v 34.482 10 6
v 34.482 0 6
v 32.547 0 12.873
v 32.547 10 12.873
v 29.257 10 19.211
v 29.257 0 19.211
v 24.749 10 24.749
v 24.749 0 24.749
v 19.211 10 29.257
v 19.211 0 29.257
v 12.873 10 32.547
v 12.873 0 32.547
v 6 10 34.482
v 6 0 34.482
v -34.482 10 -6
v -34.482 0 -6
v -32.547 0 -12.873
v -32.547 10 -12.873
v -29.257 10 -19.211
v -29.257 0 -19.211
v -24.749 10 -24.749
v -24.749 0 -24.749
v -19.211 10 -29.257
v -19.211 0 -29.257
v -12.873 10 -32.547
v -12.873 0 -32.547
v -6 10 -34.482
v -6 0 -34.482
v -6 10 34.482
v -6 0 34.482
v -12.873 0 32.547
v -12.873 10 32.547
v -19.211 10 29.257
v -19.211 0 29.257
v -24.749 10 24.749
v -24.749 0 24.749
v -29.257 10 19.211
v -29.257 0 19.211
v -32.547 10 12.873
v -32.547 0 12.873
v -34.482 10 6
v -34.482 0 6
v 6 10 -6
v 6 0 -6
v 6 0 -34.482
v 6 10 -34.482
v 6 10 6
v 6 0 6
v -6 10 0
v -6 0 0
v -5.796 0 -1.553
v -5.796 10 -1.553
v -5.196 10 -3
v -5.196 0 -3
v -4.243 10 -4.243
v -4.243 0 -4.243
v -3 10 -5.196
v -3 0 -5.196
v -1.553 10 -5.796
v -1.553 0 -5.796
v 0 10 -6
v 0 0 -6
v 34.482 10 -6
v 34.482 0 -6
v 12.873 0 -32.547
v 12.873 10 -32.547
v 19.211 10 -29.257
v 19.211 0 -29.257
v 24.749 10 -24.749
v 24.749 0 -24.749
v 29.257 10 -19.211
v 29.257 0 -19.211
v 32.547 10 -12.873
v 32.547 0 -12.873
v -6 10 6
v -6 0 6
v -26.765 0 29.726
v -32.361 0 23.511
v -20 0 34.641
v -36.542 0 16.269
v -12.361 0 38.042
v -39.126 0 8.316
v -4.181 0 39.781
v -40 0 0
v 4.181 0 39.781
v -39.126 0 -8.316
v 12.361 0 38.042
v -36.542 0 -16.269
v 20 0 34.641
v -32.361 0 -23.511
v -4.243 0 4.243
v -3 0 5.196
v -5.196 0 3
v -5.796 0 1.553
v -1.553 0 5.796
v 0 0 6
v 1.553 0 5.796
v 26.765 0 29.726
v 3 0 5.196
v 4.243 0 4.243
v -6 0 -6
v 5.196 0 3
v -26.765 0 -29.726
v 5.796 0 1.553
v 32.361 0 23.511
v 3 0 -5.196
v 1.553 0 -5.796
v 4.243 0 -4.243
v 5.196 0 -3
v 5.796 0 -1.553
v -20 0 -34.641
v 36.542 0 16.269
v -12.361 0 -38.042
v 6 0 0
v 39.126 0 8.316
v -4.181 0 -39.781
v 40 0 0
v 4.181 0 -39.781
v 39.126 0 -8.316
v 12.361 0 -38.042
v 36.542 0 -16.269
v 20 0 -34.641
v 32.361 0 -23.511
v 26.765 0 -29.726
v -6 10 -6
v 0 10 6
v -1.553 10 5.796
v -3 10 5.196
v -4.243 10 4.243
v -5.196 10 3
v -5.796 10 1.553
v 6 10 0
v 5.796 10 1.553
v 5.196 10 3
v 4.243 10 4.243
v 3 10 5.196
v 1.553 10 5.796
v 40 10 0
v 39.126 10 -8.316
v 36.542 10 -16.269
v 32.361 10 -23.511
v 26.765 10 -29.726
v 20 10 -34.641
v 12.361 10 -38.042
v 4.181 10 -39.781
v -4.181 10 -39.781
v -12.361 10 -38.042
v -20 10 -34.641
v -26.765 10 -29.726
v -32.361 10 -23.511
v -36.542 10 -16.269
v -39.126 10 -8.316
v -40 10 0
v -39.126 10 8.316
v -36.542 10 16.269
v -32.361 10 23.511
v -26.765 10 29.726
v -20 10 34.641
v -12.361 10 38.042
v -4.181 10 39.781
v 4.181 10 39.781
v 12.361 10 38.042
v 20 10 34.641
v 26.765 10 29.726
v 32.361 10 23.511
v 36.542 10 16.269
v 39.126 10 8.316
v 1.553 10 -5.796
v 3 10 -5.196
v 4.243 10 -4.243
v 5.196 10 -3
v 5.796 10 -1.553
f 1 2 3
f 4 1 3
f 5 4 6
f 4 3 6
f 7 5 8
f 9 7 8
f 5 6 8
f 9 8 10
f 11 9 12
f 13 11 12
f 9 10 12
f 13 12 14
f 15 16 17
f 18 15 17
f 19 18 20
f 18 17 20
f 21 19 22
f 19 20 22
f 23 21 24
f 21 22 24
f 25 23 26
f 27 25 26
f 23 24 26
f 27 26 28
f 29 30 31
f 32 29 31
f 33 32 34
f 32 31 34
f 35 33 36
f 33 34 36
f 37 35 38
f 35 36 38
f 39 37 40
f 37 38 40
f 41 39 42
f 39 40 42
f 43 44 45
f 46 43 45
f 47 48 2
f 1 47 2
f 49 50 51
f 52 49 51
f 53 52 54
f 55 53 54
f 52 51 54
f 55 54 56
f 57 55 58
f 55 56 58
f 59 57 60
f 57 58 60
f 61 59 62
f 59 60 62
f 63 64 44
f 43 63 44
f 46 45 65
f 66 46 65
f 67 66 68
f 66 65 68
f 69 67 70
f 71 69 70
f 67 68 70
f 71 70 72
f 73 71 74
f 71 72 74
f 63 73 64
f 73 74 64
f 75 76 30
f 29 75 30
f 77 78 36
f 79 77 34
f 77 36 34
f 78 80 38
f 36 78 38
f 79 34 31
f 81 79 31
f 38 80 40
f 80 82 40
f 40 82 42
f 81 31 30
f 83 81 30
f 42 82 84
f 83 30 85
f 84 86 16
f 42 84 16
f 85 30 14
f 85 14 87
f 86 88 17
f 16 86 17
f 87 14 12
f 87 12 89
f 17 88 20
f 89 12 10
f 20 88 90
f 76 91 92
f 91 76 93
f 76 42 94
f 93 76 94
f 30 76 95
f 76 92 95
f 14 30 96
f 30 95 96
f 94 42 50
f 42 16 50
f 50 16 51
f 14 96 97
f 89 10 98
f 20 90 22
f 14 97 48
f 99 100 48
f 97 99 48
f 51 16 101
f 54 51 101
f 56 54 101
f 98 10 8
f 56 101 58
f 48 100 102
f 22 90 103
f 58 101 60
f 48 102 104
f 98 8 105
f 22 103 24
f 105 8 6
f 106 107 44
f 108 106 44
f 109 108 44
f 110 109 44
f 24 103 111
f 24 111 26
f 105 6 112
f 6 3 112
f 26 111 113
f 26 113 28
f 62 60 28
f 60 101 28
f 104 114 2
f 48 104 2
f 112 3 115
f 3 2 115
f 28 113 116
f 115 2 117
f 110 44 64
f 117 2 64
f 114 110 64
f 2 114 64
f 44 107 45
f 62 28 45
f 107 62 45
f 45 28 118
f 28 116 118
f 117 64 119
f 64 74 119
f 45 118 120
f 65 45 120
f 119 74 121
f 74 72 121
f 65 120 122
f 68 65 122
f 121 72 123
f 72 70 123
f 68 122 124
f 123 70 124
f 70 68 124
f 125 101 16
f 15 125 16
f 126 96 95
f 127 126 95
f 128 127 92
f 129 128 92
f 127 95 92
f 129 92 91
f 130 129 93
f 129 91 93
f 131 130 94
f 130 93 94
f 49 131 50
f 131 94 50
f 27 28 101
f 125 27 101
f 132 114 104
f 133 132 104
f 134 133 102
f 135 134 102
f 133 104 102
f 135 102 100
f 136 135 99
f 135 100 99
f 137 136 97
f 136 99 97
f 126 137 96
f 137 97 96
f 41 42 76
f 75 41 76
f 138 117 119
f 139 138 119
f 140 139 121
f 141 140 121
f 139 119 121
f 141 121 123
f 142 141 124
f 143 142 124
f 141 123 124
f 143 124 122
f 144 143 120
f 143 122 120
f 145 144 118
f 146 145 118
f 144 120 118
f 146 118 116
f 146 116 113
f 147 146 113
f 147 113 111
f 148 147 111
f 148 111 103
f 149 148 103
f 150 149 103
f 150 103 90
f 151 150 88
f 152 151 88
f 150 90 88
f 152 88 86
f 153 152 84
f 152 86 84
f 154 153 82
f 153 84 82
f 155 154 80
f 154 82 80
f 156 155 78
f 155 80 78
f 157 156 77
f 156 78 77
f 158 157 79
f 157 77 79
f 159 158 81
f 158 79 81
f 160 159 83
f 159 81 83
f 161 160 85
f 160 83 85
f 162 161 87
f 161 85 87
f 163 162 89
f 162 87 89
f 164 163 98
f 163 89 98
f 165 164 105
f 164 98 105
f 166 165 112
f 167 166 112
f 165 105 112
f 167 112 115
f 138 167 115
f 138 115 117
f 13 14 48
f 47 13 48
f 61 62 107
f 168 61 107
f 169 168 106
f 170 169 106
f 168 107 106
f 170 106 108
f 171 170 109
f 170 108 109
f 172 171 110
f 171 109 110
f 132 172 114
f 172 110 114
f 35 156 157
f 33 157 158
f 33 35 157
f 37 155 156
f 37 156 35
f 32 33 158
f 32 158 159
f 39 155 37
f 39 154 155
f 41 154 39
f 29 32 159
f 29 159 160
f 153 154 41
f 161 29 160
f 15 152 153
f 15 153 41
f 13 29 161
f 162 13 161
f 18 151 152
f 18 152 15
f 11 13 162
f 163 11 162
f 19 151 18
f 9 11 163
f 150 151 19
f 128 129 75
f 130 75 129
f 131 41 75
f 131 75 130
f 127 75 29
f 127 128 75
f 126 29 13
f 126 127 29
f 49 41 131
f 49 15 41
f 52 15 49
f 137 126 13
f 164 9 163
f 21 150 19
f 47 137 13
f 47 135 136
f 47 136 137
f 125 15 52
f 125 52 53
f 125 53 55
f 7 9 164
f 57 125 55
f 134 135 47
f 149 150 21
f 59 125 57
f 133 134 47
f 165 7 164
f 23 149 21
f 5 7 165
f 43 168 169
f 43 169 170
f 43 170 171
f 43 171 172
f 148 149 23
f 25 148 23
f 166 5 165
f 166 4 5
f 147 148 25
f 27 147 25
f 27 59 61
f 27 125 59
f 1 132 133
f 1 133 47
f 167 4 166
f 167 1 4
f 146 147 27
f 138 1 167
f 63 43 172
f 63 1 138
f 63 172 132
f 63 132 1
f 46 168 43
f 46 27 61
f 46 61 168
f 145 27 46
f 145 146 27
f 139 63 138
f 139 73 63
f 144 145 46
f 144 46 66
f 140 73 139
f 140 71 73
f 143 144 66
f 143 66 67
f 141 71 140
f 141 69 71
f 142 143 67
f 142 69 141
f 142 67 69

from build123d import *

# Parameters (mm, degrees)
SKETCH1_R           = 40
SKETCH1_R_2         = 35
BOSS_EXTRUDE1_DEPTH = 10


with BuildPart() as part:
    # Sketch1 → Boss-Extrude1 (new body)
    with BuildSketch(Plane(origin=(0, 0, 0), x_dir=(1, 0, 0), z_dir=(0, 1, 0))):
        Circle(SKETCH1_R)
        Circle(SKETCH1_R_2, mode=Mode.SUBTRACT)
        with BuildLine():
            Line((-6, 0), (-6, 6))
            Line((-6, 6), (-34.481879299, 6))
            ThreePointArc((-34.481879299, 6), (-35, 0), (-34.481879299, -6))
            Line((-34.481879299, -6), (-6, -6))
            Line((-6, -6), (-6, 0))
        make_face()
        with BuildLine():
            Line((6, -34.481879299), (6, -6))
            Line((6, -6), (0, -6))
            Line((0, -6), (-6, -6))
            Line((-6, -6), (-6, -34.481879299))
            ThreePointArc((-6, -34.481879299), (0, -35), (6, -34.481879299))
        make_face()
        with BuildLine():
            Line((6, 6), (6, 0))
            Line((6, 0), (6, -6))
            Line((6, -6), (34.481879299, -6))
            ThreePointArc((34.481879299, -6), (34.870229247, -3.011164603), (35, 0))
            ThreePointArc((35, 0), (34.870229247, 3.011164603), (34.481879299, 6))
            Line((34.481879299, 6), (6, 6))
        make_face()
        with BuildLine():
            Line((0, 6), (6, 6))
            Line((6, 6), (6, 34.481879299))
            ThreePointArc((6, 34.481879299), (0, 35), (-6, 34.481879299))
            Line((-6, 34.481879299), (-6, 6))
            Line((-6, 6), (0, 6))
        make_face()
        with BuildLine():
            Line((-6, -6), (0, -6))
            ThreePointArc((0, -6), (-4.242640687, -4.242640687), (-6, 0))
            Line((-6, 0), (-6, -6))
        make_face()
        with BuildLine():
            Line((6, -6), (6, 0))
            ThreePointArc((6, 0), (4.242640687, -4.242640687), (0, -6))
            Line((0, -6), (6, -6))
        make_face()
        with BuildLine():
            ThreePointArc((0, 6), (4.242640687, 4.242640687), (6, 0))
            Line((6, 0), (6, 6))
            Line((6, 6), (0, 6))
        make_face()
        with BuildLine():
            ThreePointArc((-6, 0), (-4.242640687, 4.242640687), (0, 6))
            Line((0, 6), (-6, 6))
            Line((-6, 6), (-6, 0))
        make_face()
    extrude(amount=BOSS_EXTRUDE1_DEPTH)


solid = part.part
